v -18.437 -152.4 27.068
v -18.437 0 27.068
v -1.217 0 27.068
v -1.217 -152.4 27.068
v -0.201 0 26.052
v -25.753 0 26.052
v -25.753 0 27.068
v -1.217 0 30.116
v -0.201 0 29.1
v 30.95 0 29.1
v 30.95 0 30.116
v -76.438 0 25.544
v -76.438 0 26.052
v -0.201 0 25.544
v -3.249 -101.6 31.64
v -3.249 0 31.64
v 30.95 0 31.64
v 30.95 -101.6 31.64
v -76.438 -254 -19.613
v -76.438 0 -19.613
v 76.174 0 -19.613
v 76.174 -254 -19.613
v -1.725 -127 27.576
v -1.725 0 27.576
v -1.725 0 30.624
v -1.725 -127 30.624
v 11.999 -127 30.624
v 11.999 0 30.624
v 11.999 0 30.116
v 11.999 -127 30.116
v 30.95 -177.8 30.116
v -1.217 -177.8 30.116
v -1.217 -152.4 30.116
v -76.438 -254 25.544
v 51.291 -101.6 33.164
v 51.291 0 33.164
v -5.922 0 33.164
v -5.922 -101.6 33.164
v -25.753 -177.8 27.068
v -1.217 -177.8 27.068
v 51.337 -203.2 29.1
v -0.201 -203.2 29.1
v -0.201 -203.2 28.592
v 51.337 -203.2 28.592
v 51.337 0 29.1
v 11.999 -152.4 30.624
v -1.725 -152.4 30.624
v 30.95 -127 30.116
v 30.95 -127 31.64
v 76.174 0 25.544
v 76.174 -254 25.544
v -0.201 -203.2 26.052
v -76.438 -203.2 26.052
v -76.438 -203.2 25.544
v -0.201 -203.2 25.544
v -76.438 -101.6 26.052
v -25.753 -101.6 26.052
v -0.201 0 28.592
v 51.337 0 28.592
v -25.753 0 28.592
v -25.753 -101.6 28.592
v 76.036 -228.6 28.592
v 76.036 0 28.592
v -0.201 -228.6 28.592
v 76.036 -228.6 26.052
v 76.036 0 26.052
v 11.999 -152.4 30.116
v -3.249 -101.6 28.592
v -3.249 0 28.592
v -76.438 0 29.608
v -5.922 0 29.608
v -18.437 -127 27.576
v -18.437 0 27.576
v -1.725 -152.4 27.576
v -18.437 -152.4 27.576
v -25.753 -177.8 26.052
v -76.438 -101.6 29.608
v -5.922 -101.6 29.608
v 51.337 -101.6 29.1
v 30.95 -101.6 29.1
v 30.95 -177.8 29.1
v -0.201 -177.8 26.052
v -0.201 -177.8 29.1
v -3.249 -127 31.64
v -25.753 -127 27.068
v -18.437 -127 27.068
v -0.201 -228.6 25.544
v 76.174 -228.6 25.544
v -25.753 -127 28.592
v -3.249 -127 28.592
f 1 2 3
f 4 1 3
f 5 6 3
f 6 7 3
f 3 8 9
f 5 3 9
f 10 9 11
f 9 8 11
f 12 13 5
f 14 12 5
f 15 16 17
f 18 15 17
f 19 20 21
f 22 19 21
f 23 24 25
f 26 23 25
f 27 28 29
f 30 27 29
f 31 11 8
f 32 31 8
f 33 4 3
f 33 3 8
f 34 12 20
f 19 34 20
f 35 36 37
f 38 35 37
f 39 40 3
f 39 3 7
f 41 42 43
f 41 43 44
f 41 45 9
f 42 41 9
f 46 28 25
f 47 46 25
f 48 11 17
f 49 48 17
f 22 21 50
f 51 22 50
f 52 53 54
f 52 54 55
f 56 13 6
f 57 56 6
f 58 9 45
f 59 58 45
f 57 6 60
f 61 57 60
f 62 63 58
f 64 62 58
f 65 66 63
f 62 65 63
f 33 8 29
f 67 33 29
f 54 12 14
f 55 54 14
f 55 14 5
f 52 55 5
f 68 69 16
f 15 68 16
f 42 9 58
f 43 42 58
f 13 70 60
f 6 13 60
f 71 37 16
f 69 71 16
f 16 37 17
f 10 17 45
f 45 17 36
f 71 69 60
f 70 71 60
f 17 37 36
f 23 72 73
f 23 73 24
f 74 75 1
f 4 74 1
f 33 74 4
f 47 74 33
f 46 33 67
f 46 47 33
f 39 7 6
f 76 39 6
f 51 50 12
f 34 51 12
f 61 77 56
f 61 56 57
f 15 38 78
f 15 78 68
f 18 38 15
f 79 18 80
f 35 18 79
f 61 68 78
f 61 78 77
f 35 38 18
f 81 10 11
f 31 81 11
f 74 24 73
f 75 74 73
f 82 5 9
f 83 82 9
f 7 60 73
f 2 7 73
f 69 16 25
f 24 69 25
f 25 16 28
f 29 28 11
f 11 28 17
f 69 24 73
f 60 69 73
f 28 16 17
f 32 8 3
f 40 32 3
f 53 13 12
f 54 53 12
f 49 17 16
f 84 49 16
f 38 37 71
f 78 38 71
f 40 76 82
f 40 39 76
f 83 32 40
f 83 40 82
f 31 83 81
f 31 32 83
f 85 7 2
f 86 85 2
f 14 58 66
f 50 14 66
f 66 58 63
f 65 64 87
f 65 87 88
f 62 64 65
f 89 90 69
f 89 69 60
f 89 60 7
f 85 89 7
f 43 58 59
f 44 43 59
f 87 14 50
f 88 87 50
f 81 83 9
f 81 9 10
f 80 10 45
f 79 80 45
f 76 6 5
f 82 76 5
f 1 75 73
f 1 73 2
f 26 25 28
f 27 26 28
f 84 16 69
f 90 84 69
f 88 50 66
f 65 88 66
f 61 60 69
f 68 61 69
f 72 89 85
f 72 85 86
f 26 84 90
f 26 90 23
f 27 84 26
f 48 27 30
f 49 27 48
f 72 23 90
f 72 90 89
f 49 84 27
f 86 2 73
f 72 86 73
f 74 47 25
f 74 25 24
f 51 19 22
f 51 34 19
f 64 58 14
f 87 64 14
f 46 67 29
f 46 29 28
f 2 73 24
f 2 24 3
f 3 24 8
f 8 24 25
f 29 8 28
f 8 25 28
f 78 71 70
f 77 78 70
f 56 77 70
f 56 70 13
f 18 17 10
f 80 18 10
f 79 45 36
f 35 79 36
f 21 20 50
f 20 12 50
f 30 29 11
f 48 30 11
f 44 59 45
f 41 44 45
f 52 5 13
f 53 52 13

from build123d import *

# Parameters (mm, degrees)
F1_DEPTH = 254
F2_DEPTH = 228.6
F3_DEPTH = 203.2
F4_DEPTH = 177.8
F5_DEPTH = 152.4
F6_DEPTH = 127
F7_DEPTH = 101.6


with BuildPart() as f1:
    # F0 (on Front) → F1 (new body)
    with BuildSketch(Plane.XZ):
        Polygon((-76.438032, 25.036076), (-76.438032, -19.613271), (76.173723, -19.613271), (76.173723, 23.512076), (76.173723, 25.544076), (-0.200935, 25.544076), (-76.438032, 25.544076), align=None)
    extrude(amount=F1_DEPTH)


with BuildPart() as f2:
    # F0 (on Front) → F2 (new body)
    with BuildSketch(Plane.XZ):
        Polygon((-0.200935, 26.052076), (76.036163, 26.052076), (76.036163, 28.592076), (69.713205, 28.592076), (51.336631, 28.592076), (-0.200935, 28.592076), align=None)
        Polygon((-0.200935, 25.544076), (76.173723, 25.544076), (76.036163, 26.052076), (-0.200935, 26.052076), align=None)
    extrude(amount=F2_DEPTH)


with BuildPart() as f3:
    # F0 (on Front) → F3 (new body)
    with BuildSketch(Plane.XZ):
        Polygon((-76.438032, 26.052076), (-76.438032, 25.544076), (-0.200935, 25.544076), (-0.200935, 26.052076), (-25.752865, 26.052076), align=None)
        Polygon((-0.200935, 29.100076), (-0.200935, 28.592076), (51.336631, 28.592076), (51.336631, 29.100076), (30.95011, 29.100076), align=None)
    extrude(amount=F3_DEPTH)


with BuildPart() as f4:
    # F0 (on Front) → F4 (new body)
    with BuildSketch(Plane.XZ):
        Polygon((-25.752865, 26.052076), (-0.200935, 26.052076), (-0.200935, 28.592076), (-0.200935, 29.100076), (30.95011, 29.100076), (30.95011, 30.116076), (11.999259, 30.116076), (-1.216935, 30.116076), (-1.216935, 27.068076), (-18.436953, 27.068076), (-25.752865, 27.068076), align=None)
    extrude(amount=F4_DEPTH)


with BuildPart() as f5:
    # F0 (on Front) → F5 (new body)
    with BuildSketch(Plane.XZ):
        Polygon((-18.436953, 27.576076), (-18.436953, 27.068076), (-1.216935, 27.068076), (-1.216935, 30.116076), (11.999259, 30.116076), (11.999259, 30.624076), (-1.724935, 30.624076), (-1.724935, 27.576076), align=None)
    extrude(amount=F5_DEPTH)


with BuildPart() as f6:
    # F0 (on Front) → F6 (new body)
    with BuildSketch(Plane.XZ):
        Polygon((-25.752865, 28.592076), (-25.752865, 27.068076), (-18.436953, 27.068076), (-18.436953, 27.576076), (-1.724935, 27.576076), (-1.724935, 30.624076), (11.999259, 30.624076), (11.999259, 30.116076), (30.95011, 30.116076), (30.95011, 31.640076), (-3.248935, 31.640076), (-3.248935, 28.592076), align=None)
    extrude(amount=F6_DEPTH)


with BuildPart() as f7:
    # F0 (on Front) → F7 (new body)
    with BuildSketch(Plane.XZ):
        Polygon((-76.438032, 29.608076), (-76.438032, 26.052076), (-25.752865, 26.052076), (-25.752865, 27.068076), (-25.752865, 28.592076), (-3.248935, 28.592076), (-3.248935, 31.640076), (30.95011, 31.640076), (30.95011, 30.116076), (30.95011, 29.100076), (51.336631, 29.100076), (51.291214, 33.163823), (-5.921619, 33.163823), (-5.921619, 29.608076), align=None)
    extrude(amount=F7_DEPTH)


solid = Compound([f1.part, f2.part, f3.part, f4.part, f5.part, f6.part, f7.part])
